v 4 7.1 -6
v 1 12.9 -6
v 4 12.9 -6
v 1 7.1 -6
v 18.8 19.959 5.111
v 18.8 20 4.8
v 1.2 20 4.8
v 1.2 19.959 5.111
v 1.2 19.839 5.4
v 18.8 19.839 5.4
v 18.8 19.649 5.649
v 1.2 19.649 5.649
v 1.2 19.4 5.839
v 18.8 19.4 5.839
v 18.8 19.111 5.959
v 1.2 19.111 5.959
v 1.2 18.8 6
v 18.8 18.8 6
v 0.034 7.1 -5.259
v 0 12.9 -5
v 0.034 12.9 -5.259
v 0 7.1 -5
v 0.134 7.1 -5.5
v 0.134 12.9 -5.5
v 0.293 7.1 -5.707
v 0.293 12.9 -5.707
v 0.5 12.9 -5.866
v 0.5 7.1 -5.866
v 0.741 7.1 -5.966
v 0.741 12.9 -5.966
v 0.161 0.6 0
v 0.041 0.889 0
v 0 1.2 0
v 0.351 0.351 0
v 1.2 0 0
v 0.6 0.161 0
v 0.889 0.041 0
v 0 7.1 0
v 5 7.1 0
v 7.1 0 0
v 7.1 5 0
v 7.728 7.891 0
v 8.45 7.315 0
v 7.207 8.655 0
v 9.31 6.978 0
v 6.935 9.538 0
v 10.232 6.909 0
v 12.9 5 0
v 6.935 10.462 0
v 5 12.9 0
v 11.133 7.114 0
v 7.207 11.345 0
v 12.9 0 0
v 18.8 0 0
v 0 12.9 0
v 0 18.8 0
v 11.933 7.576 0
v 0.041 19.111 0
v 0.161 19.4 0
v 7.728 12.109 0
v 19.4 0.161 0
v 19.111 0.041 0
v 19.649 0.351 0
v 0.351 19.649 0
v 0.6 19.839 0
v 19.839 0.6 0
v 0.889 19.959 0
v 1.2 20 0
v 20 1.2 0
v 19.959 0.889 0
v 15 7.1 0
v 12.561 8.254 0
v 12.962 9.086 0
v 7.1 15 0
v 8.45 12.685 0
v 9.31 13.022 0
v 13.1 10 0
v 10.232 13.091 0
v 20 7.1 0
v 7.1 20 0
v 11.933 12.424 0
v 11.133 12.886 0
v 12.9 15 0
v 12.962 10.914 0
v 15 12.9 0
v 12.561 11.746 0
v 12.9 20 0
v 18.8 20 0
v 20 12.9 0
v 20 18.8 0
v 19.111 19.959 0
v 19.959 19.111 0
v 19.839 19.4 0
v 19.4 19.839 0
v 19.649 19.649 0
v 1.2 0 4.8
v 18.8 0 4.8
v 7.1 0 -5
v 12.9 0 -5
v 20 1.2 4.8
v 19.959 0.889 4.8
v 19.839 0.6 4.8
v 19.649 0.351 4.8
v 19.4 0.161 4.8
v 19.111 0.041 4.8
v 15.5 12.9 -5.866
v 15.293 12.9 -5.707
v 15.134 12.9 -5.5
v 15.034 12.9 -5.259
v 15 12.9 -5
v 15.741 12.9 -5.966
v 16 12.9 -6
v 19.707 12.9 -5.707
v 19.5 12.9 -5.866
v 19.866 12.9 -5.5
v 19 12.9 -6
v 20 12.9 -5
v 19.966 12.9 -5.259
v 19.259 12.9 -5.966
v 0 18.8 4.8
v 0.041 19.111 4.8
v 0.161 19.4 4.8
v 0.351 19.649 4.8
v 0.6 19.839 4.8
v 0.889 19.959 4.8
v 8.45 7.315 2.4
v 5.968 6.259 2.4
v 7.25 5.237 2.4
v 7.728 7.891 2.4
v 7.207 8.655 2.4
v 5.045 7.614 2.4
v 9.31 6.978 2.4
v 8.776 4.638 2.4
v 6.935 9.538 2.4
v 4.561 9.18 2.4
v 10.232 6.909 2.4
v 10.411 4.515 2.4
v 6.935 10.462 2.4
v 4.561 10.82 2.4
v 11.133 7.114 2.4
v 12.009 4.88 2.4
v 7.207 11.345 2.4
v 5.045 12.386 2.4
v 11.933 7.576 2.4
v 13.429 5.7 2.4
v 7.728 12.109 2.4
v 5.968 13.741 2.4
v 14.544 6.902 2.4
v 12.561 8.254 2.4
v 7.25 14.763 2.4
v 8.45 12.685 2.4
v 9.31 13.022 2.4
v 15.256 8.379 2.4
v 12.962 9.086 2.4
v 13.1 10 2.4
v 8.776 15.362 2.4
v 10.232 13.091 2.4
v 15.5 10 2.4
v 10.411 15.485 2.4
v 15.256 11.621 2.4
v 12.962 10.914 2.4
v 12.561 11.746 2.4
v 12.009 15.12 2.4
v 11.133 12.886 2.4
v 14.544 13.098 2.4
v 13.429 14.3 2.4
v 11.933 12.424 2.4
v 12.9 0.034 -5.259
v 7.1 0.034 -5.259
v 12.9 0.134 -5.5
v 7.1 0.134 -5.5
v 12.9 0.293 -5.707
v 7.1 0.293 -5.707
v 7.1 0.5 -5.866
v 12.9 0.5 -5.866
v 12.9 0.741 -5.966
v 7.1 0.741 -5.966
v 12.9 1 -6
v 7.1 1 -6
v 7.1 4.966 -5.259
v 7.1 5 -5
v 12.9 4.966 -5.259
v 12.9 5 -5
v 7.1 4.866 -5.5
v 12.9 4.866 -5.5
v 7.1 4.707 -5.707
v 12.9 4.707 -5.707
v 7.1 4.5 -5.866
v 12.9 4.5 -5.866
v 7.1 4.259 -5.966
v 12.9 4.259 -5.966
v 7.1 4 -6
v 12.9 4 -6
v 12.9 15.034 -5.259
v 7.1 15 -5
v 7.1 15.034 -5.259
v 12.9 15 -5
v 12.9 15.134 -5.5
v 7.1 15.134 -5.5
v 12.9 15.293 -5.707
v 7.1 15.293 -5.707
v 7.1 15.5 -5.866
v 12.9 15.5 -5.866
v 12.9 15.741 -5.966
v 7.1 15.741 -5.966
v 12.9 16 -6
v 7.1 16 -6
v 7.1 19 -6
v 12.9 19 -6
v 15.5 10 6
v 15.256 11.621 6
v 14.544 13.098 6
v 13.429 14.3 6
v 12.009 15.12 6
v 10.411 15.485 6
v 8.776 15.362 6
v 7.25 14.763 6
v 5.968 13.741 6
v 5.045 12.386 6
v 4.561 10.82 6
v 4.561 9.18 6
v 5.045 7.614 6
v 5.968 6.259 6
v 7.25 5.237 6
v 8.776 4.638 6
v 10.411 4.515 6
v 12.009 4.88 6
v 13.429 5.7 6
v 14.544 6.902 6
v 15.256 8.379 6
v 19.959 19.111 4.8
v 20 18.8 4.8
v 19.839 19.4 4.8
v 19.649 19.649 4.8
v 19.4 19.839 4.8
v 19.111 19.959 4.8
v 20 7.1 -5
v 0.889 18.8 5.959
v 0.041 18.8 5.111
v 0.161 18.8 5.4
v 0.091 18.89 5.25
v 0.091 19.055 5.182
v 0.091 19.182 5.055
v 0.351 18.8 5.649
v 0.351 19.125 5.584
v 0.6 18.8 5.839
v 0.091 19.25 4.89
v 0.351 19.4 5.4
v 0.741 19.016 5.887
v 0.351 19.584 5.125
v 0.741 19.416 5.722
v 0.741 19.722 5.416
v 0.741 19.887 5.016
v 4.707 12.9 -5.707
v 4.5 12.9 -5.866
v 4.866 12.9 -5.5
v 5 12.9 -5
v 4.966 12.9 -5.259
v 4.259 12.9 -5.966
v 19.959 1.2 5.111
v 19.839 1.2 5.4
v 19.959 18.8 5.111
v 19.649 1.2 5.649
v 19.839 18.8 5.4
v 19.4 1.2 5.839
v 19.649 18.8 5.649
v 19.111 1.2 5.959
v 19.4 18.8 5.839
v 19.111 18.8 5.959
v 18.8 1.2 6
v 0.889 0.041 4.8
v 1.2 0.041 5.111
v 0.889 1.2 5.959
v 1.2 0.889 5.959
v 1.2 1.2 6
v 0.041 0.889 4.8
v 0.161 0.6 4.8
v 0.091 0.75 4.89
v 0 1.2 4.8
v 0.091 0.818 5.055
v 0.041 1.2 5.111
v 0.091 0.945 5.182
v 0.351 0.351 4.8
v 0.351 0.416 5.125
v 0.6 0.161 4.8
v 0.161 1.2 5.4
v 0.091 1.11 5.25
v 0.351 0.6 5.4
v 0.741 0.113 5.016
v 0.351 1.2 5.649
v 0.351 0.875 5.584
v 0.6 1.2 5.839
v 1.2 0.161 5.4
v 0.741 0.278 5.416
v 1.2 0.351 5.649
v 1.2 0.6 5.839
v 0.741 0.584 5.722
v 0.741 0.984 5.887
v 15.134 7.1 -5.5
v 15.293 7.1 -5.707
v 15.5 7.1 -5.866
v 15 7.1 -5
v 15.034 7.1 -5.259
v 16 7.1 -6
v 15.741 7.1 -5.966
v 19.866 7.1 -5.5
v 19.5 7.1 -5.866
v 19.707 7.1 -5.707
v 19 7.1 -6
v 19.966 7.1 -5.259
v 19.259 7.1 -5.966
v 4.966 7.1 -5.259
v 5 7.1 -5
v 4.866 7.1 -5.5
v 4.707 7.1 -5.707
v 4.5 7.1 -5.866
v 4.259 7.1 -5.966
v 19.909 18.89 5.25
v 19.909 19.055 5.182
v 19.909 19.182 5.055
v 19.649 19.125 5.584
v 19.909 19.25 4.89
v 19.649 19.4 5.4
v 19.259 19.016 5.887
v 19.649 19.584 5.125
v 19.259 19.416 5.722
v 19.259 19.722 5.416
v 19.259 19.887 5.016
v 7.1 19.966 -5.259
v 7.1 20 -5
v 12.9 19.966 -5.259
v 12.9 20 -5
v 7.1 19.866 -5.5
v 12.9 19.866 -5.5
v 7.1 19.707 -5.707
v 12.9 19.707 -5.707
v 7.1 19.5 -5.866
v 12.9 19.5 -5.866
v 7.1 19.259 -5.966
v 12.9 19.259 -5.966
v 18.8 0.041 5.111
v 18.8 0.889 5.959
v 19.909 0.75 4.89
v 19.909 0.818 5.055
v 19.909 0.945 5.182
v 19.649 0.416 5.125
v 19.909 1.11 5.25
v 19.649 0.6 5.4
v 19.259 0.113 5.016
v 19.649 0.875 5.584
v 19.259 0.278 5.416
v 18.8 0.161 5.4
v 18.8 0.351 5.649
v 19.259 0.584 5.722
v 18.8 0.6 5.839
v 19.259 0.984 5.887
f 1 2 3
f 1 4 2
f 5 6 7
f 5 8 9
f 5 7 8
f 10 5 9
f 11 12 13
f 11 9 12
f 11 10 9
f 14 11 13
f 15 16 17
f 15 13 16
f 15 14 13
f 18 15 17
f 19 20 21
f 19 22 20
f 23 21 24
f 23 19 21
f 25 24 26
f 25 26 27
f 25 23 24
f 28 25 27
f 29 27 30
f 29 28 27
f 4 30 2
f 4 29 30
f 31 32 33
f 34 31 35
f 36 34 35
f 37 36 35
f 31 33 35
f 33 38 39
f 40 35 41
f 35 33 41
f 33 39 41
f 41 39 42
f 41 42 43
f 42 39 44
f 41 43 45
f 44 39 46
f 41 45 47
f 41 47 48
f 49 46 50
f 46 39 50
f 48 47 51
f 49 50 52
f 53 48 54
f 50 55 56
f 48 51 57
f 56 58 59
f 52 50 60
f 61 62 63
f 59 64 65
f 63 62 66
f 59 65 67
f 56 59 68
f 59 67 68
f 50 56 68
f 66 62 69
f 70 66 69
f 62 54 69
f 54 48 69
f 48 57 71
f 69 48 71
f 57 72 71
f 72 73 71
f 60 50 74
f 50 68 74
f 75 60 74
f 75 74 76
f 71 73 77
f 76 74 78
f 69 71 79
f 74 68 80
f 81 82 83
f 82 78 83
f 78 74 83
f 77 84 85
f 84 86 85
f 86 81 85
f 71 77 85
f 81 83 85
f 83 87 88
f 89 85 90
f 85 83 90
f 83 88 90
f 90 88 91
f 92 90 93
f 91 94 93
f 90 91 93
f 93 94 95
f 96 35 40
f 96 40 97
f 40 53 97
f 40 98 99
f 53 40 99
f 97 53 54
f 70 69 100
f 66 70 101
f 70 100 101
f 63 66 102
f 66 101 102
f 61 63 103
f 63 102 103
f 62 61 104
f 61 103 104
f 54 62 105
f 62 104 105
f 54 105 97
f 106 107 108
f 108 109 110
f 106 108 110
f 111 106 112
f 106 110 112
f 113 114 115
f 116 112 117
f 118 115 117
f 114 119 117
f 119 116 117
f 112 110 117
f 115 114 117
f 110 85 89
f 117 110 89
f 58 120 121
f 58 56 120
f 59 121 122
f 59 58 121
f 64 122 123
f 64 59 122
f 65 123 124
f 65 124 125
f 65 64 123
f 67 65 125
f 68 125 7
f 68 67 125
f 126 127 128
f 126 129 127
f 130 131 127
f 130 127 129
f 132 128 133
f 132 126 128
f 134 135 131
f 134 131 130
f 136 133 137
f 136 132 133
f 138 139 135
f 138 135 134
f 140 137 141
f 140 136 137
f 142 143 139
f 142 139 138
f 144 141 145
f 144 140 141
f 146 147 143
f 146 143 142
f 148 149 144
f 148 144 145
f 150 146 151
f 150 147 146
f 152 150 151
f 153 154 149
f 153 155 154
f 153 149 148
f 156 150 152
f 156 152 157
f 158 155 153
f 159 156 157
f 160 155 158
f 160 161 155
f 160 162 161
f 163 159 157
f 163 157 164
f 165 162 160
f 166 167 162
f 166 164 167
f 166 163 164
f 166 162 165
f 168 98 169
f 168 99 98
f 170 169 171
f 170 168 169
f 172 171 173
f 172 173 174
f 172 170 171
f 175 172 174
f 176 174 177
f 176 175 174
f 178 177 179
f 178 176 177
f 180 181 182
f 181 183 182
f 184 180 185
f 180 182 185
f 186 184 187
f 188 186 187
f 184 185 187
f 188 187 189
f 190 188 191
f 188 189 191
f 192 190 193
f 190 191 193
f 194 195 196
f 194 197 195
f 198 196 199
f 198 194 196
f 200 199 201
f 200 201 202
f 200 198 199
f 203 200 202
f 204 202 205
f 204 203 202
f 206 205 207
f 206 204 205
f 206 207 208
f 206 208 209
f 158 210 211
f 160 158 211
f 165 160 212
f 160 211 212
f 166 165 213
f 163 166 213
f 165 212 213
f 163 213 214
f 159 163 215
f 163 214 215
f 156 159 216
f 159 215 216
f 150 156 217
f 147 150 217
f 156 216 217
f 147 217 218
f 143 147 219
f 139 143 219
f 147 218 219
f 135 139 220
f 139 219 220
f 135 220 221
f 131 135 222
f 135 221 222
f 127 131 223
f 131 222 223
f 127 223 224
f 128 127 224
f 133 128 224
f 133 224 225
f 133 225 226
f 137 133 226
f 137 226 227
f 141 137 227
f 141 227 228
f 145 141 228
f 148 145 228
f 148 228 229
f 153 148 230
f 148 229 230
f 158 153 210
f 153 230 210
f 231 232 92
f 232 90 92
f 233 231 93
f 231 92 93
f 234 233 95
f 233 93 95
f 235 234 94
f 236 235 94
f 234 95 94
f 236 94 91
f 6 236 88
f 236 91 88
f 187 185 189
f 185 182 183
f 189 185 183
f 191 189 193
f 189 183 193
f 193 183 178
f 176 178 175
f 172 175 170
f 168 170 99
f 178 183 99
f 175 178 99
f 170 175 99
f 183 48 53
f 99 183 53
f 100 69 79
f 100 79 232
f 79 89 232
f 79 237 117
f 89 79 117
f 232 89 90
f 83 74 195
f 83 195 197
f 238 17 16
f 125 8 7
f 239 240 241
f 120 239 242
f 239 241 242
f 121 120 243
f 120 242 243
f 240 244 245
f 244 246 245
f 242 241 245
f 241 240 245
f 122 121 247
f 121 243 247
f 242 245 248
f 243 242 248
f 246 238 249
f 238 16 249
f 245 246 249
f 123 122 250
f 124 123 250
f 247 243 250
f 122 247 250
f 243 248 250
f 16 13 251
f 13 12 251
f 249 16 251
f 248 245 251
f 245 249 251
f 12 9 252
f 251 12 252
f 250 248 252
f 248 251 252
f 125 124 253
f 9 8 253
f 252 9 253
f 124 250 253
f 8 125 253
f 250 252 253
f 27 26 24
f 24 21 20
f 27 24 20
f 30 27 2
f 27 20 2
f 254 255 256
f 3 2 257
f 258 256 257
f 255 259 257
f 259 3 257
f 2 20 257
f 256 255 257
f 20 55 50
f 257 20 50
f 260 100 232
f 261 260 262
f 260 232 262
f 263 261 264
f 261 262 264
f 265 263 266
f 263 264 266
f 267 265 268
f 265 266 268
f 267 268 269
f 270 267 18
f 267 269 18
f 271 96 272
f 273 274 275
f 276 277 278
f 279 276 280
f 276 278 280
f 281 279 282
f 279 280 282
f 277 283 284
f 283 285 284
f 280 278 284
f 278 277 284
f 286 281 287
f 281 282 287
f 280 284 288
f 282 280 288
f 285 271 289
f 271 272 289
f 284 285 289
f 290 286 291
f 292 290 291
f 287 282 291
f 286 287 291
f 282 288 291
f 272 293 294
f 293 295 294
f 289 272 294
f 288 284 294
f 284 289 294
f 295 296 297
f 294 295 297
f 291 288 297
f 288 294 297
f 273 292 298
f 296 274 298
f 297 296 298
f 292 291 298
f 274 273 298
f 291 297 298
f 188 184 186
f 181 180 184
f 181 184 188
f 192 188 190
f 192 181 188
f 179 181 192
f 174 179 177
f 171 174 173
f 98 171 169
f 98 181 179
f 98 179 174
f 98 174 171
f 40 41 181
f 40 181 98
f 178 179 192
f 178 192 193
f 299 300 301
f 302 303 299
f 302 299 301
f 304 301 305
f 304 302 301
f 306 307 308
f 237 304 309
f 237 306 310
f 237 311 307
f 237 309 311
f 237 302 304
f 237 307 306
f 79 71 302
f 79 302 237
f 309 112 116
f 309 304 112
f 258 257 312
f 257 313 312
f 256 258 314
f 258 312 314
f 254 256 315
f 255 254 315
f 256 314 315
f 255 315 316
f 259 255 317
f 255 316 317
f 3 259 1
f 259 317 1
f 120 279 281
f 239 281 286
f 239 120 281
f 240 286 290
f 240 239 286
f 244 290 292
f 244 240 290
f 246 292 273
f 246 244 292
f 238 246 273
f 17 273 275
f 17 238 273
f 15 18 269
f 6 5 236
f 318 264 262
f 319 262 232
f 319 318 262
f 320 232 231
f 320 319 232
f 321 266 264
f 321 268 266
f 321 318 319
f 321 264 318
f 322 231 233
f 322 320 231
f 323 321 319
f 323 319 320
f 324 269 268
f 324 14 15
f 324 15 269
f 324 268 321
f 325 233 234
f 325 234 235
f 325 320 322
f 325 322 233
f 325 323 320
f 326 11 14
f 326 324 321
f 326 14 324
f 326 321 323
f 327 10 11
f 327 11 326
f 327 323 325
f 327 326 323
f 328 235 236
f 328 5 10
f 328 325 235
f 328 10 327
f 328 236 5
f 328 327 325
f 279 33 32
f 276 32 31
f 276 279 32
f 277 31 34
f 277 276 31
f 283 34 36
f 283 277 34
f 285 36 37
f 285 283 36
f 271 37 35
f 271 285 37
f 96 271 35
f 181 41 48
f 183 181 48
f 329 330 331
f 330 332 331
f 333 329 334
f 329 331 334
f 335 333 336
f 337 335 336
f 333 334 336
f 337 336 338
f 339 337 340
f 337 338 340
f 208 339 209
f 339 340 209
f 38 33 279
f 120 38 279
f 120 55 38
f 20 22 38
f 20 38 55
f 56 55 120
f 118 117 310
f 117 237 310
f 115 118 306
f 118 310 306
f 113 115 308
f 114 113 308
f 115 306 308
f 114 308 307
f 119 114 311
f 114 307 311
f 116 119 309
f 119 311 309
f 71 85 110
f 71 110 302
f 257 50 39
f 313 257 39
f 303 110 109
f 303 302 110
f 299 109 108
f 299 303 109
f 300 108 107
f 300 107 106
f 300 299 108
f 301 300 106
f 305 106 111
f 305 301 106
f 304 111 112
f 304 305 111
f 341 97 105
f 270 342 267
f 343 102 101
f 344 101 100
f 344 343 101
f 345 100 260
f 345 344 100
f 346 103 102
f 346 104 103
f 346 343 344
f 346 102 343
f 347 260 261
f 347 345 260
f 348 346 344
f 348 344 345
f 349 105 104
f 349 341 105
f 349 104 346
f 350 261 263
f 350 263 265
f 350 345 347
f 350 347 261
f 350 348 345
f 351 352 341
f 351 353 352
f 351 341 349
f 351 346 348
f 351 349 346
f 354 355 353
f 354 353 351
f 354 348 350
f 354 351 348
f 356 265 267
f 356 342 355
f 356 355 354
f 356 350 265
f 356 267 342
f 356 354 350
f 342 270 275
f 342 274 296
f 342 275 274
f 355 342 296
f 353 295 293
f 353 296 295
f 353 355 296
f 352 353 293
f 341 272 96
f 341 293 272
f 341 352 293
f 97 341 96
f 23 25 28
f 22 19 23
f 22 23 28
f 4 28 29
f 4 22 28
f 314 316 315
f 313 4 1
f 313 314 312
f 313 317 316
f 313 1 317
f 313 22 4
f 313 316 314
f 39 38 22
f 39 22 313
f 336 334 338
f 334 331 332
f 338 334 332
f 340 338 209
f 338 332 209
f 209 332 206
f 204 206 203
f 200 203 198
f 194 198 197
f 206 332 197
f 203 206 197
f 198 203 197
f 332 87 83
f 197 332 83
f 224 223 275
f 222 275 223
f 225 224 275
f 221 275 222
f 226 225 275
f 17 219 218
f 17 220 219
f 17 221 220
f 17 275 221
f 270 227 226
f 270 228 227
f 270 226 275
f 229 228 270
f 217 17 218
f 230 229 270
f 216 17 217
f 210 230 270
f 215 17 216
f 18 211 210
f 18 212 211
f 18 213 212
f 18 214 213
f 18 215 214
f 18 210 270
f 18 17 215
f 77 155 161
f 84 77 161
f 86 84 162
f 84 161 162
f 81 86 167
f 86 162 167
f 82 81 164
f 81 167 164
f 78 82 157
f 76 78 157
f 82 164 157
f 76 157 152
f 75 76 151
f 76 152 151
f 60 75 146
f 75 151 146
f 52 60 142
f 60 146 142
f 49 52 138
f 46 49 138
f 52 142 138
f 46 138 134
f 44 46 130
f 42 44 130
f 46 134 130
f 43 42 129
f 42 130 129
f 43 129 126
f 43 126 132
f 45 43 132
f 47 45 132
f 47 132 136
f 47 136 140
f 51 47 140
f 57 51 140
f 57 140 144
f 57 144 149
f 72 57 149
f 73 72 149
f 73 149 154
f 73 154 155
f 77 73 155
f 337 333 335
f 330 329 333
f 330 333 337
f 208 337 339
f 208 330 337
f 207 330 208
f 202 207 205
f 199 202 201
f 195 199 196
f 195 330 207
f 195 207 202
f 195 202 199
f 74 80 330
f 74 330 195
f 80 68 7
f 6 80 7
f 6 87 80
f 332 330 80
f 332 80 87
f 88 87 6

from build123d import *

# Parameters (mm, degrees)
SKETCH_W        = 20
SKETCH_H        = 20
PAD_DEPTH       = 6
SKETCH001_R     = 5.5
POCKET_DEPTH    = 3.6
SKETCH002_R     = 3.1
POCKET001_DEPTH = 5
SKETCH003_W     = 5.8
SKETCH003_H     = 5
PAD001_DEPTH    = 6
SKETCH004_W     = 5
SKETCH004_H     = 5.8
PAD002_DEPTH    = 6
SKETCH005_W     = 5.8
SKETCH005_H     = 5
PAD003_DEPTH    = 6
SKETCH006_W     = 5
SKETCH006_H     = 5.8
PAD004_DEPTH    = 6
FILLET_R        = 1.2
FILLET001_R     = 1.2
FILLET002_R     = 1.2
FILLET003_R     = 1.2
FILLET004_R     = 1
FILLET005_R     = 1
FILLET006_R     = 1
FILLET007_R     = 1
FILLET008_R     = 1
FILLET009_R     = 1
FILLET010_R     = 1
FILLET011_R     = 1


with BuildPart() as part:
    # Sketch → Pad (new body)
    with BuildSketch(Plane.XY):
        with Locations((10, 10)):
            Rectangle(SKETCH_W, SKETCH_H)
    extrude(amount=PAD_DEPTH)

    # Sketch001 → Pocket (cut)
    with BuildSketch(Plane.XY.offset(6)):
        with Locations((10, 10)):
            Circle(SKETCH001_R)
    extrude(amount=-POCKET_DEPTH, mode=Mode.SUBTRACT)

    # Sketch002 → Pocket001 (cut)
    with BuildSketch(Plane.XY.offset(2.4)):
        with Locations((10, 10)):
            Circle(SKETCH002_R)
    extrude(amount=-POCKET001_DEPTH, mode=Mode.SUBTRACT)

    # Sketch003 → Pad001 (new body)
    with BuildSketch(Plane(origin=(0, 0, 0), x_dir=(1, 0, 0), z_dir=(0, 0, -1))):
        with Locations((10, -2.5)):
            Rectangle(SKETCH003_W, SKETCH003_H)
    extrude(amount=PAD001_DEPTH)

    # Sketch004 → Pad002 (new body)
    with BuildSketch(Plane(origin=(0, 0, 0), x_dir=(1, 0, 0), z_dir=(0, 0, -1))):
        with Locations((17.5, -10)):
            Rectangle(SKETCH004_W, SKETCH004_H)
    extrude(amount=PAD002_DEPTH)

    # Sketch005 → Pad003 (new body)
    with BuildSketch(Plane(origin=(0, 0, 0), x_dir=(1, 0, 0), z_dir=(0, 0, -1))):
        with Locations((10, -17.5)):
            Rectangle(SKETCH005_W, SKETCH005_H)
    extrude(amount=PAD003_DEPTH)

    # Sketch006 → Pad004 (new body)
    with BuildSketch(Plane(origin=(0, 0, 0), x_dir=(1, 0, 0), z_dir=(0, 0, -1))):
        with Locations((2.5, -10)):
            Rectangle(SKETCH006_W, SKETCH006_H)
    extrude(amount=PAD004_DEPTH)

    # Fillet
    fillet_edges = [part.edges().sort_by_distance(p)[0] for p in [
        (10, 20, 6),
    ]]
    fillet(fillet_edges, radius=FILLET_R)

    # Fillet001
    fillet001_edges = [part.edges().sort_by_distance(p)[0] for p in [
        (10, 0, 6),
    ]]
    fillet(fillet001_edges, radius=FILLET001_R)

    # Fillet002
    fillet002_edges = [part.edges().sort_by_distance(p)[0] for p in [
        (0, 10, 6),
    ]]
    fillet(fillet002_edges, radius=FILLET002_R)

    # Fillet003
    fillet003_edges = [part.edges().sort_by_distance(p)[0] for p in [
        (20, 10, 6),
    ]]
    fillet(fillet003_edges, radius=FILLET003_R)

    # Fillet004
    fillet004_edges = [part.edges().sort_by_distance(p)[0] for p in [
        (15, 10, -6),
    ]]
    fillet(fillet004_edges, radius=FILLET004_R)

    # Fillet005
    fillet005_edges = [part.edges().sort_by_distance(p)[0] for p in [
        (10, 5, -6),
    ]]
    fillet(fillet005_edges, radius=FILLET005_R)

    # Fillet006
    fillet006_edges = [part.edges().sort_by_distance(p)[0] for p in [
        (10, 15, -6),
    ]]
    fillet(fillet006_edges, radius=FILLET006_R)

    # Fillet007
    fillet007_edges = [part.edges().sort_by_distance(p)[0] for p in [
        (5, 10, -6),
    ]]
    fillet(fillet007_edges, radius=FILLET007_R)

    # Fillet008
    fillet008_edges = [part.edges().sort_by_distance(p)[0] for p in [
        (20, 10, -6),
    ]]
    fillet(fillet008_edges, radius=FILLET008_R)

    # Fillet009
    fillet009_edges = [part.edges().sort_by_distance(p)[0] for p in [
        (10, 0, -6),
    ]]
    fillet(fillet009_edges, radius=FILLET009_R)

    # Fillet010
    fillet010_edges = [part.edges().sort_by_distance(p)[0] for p in [
        (10, 20, -6),
    ]]
    fillet(fillet010_edges, radius=FILLET010_R)

    # Fillet011
    fillet011_edges = [part.edges().sort_by_distance(p)[0] for p in [
        (0, 10, -6),
    ]]
    fillet(fillet011_edges, radius=FILLET011_R)


solid = part.part
